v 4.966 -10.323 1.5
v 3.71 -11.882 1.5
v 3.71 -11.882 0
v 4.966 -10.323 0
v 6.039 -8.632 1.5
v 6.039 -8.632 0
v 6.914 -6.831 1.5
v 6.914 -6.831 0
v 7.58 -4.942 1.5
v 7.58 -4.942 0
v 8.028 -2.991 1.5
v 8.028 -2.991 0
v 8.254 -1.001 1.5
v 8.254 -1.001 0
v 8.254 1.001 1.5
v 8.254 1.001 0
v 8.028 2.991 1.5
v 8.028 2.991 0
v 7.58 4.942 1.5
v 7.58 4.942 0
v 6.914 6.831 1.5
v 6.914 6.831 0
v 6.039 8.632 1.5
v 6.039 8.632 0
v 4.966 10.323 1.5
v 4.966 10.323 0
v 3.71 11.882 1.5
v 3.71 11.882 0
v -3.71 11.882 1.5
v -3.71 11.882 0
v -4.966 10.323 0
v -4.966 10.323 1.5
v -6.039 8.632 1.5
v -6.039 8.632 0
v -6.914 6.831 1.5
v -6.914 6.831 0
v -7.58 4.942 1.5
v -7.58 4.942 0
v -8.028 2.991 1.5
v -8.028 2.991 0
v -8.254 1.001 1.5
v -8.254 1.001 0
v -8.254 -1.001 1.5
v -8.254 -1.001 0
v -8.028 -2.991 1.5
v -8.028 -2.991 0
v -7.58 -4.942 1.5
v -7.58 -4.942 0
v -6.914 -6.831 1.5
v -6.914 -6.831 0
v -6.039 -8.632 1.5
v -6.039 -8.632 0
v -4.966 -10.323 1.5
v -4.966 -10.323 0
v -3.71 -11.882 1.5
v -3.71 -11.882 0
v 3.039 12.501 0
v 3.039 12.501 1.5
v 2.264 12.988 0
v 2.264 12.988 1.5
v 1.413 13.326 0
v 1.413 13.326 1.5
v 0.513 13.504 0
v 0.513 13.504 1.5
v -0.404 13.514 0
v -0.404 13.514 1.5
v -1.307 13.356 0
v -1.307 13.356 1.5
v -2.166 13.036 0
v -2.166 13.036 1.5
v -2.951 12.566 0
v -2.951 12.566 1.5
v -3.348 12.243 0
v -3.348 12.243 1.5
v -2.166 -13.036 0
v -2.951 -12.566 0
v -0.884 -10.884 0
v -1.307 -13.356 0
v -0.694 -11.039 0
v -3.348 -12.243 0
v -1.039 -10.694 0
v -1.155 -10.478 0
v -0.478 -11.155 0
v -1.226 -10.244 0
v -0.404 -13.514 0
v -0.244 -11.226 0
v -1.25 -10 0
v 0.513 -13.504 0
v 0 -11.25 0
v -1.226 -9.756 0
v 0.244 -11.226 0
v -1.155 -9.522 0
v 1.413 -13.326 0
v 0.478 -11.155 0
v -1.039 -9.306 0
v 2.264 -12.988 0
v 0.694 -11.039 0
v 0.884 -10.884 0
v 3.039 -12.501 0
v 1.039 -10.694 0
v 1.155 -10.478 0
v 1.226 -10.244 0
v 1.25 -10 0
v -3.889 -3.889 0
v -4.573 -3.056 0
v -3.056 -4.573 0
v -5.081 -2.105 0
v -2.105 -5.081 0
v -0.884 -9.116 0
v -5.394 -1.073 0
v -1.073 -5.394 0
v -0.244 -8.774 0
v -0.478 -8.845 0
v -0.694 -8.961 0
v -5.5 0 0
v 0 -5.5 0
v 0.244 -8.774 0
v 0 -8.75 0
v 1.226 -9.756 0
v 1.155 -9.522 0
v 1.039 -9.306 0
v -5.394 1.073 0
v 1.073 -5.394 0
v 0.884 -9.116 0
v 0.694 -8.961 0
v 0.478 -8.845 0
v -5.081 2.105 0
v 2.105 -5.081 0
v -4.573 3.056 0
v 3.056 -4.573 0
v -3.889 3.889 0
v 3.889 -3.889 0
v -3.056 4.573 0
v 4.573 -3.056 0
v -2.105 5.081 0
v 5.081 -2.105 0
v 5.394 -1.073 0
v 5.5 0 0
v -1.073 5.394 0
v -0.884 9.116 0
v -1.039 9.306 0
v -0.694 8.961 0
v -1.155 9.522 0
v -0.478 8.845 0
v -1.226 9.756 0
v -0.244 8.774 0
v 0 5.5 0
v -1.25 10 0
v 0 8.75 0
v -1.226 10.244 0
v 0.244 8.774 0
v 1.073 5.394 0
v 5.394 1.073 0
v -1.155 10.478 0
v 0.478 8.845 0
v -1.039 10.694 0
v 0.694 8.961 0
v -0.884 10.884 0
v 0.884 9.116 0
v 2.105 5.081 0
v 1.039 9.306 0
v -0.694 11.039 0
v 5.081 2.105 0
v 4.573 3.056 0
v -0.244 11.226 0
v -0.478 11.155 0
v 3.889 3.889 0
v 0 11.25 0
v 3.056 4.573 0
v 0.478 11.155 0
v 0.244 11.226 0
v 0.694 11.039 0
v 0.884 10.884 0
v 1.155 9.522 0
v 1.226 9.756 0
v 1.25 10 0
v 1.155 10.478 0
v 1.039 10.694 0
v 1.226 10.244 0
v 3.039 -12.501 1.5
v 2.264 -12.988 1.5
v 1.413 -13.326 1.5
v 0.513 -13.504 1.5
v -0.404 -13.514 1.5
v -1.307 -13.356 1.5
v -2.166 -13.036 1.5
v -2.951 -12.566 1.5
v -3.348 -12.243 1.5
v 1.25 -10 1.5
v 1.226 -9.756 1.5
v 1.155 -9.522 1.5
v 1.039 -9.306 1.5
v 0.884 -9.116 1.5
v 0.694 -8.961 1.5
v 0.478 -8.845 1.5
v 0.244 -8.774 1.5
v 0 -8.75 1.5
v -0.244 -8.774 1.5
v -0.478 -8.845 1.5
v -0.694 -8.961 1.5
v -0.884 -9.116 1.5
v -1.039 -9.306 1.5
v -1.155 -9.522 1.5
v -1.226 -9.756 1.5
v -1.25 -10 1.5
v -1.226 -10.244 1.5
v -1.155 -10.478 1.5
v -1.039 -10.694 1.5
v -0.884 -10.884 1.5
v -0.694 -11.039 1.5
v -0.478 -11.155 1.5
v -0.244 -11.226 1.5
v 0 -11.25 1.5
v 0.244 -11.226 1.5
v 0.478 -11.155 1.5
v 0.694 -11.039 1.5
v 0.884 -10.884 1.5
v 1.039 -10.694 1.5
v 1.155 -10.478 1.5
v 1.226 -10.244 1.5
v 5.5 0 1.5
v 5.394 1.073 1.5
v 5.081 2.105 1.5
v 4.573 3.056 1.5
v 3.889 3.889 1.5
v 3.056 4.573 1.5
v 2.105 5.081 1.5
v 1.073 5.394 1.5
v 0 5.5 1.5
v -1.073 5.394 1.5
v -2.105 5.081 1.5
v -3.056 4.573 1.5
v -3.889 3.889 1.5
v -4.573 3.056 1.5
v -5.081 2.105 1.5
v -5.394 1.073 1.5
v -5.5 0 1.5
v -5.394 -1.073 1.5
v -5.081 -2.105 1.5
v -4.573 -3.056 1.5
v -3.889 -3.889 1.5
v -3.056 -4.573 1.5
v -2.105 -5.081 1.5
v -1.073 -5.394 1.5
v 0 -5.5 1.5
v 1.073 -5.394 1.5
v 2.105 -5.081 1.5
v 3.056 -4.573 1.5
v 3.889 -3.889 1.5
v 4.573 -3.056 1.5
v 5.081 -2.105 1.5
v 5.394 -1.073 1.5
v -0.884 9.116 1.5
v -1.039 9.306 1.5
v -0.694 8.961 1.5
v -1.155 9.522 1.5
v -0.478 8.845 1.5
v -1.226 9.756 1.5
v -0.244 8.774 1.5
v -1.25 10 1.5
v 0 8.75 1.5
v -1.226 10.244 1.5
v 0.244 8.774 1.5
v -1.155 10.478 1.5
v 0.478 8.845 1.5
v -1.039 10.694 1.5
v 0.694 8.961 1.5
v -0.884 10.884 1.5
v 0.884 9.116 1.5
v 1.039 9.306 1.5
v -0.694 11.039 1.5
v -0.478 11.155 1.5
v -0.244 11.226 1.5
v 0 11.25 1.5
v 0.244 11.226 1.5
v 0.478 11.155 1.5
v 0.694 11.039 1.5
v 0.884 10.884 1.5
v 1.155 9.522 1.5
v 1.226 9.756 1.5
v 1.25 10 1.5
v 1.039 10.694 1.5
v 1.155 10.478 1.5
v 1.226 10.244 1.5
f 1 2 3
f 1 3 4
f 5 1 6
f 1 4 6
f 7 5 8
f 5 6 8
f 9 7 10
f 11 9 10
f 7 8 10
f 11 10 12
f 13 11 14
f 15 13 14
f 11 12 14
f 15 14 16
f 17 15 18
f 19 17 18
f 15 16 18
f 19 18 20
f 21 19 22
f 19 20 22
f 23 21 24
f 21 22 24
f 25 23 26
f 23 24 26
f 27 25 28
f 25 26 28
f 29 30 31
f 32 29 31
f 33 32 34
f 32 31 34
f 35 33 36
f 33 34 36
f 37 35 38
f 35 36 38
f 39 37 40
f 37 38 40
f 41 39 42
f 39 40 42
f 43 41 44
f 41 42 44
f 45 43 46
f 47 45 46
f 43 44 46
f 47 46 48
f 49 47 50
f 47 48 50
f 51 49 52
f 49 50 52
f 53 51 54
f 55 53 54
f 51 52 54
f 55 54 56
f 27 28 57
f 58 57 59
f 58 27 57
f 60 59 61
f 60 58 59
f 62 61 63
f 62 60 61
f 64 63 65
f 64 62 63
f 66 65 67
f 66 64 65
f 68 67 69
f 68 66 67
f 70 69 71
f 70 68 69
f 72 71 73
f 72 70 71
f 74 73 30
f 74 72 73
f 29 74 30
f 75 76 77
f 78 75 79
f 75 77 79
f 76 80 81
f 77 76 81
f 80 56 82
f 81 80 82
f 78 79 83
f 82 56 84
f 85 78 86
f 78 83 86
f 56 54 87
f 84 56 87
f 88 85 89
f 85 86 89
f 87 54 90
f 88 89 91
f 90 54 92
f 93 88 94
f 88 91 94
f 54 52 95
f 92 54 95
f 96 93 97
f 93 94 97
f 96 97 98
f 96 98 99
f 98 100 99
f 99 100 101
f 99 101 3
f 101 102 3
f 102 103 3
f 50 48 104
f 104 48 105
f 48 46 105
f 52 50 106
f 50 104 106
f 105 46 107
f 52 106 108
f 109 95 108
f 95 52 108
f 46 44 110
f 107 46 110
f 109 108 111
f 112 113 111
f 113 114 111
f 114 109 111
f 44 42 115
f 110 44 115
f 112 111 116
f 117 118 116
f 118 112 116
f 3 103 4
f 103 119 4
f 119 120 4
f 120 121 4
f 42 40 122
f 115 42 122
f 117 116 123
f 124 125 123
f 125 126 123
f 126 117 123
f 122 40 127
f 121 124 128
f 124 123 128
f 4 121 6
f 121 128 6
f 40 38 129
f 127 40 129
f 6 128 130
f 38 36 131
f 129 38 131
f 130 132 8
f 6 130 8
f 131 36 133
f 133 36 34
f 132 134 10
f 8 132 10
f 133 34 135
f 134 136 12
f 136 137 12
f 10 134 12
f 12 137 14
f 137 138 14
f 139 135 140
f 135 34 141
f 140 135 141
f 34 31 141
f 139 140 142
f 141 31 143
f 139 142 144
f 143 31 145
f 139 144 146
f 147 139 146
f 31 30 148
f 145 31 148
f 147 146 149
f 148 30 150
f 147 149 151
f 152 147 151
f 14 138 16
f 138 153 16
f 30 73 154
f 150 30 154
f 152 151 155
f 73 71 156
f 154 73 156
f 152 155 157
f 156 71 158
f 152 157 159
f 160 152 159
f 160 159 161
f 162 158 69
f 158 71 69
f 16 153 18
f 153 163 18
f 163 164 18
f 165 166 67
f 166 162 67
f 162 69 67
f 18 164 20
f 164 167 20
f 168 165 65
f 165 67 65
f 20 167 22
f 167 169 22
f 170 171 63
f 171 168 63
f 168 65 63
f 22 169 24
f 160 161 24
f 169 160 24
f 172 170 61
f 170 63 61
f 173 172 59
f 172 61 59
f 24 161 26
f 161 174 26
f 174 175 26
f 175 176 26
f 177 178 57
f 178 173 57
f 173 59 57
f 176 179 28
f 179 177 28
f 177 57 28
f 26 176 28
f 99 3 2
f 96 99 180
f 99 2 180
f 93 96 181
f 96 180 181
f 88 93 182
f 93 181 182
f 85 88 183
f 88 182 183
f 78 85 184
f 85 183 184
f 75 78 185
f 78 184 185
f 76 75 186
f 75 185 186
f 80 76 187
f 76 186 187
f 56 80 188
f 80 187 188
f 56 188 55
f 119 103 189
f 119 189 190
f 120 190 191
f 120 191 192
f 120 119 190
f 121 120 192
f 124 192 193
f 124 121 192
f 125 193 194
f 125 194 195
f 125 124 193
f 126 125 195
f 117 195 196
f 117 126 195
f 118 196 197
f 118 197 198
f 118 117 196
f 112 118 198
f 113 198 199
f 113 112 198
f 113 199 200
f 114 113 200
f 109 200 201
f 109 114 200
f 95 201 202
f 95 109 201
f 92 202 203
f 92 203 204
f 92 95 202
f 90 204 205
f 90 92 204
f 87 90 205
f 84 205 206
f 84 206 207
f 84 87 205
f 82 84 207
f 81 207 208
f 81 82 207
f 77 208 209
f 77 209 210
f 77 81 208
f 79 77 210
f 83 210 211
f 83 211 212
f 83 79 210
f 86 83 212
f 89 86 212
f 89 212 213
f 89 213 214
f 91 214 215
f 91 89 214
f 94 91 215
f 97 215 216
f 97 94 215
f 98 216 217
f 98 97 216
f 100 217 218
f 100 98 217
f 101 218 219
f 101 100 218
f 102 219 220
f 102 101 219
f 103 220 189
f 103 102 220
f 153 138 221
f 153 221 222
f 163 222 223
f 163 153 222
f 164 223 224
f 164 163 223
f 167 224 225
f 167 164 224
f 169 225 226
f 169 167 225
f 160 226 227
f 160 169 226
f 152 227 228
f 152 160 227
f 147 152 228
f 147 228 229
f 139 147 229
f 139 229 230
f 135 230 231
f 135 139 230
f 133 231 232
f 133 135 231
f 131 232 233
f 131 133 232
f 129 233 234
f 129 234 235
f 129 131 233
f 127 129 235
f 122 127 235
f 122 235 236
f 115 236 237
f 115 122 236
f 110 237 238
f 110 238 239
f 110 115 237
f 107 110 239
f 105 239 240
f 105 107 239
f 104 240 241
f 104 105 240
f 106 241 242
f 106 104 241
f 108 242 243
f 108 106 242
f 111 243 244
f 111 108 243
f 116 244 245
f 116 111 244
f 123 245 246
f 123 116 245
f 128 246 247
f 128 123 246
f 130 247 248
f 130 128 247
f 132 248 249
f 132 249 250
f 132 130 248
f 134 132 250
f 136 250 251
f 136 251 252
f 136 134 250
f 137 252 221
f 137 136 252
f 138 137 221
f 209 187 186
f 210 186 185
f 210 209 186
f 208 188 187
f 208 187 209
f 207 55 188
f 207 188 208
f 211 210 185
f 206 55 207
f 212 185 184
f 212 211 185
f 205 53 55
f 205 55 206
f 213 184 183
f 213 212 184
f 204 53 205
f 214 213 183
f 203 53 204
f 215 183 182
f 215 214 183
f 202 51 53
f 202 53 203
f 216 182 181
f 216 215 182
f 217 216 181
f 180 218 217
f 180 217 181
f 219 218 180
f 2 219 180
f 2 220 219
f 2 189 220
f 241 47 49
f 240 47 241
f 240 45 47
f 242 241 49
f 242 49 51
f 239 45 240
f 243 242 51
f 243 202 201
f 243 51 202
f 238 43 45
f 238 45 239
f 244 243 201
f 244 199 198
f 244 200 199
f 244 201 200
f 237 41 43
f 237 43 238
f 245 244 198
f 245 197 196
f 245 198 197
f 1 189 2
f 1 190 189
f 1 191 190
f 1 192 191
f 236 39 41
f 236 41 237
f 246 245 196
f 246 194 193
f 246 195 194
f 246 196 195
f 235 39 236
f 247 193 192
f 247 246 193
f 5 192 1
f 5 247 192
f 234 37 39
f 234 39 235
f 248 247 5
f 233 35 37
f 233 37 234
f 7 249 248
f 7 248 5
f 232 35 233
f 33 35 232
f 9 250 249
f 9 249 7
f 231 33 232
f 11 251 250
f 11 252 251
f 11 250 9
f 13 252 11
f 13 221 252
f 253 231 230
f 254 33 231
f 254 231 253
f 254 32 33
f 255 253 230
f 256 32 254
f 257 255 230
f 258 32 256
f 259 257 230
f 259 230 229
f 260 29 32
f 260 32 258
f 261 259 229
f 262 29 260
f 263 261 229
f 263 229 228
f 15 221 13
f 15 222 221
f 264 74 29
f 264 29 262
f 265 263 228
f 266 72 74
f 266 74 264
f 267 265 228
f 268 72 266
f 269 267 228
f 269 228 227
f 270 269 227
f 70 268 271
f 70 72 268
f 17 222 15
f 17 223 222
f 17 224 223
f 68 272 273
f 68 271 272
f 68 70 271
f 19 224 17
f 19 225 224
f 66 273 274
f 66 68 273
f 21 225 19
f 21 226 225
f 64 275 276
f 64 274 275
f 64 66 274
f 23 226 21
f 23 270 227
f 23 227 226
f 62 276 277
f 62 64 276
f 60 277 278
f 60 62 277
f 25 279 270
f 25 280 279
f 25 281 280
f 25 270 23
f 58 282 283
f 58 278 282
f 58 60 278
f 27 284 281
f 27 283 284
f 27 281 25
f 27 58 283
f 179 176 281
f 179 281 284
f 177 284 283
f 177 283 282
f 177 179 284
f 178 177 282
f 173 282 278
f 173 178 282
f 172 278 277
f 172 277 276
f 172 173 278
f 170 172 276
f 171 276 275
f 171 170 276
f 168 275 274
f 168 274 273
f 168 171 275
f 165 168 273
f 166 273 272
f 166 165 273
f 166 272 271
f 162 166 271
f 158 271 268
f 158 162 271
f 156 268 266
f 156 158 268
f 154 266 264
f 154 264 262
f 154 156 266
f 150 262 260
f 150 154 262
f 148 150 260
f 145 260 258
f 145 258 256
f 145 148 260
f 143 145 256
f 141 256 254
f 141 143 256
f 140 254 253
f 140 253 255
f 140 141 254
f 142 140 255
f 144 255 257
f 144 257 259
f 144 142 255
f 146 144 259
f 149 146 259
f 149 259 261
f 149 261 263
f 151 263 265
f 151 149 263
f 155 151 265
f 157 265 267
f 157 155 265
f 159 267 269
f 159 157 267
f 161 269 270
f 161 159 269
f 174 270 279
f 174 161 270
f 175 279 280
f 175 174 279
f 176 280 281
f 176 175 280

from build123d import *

# Parameters (mm, degrees)
F0_R     = 1.25
F0_R_2   = 5.5
F1_DEPTH = 1.5
F2_R     = 5


with BuildPart() as f1:
    # F0 (on Top) → F1 (new body)
    with BuildSketch(Plane.XY):
        with BuildLine():
            ThreePointArc((0, -15), (8.2826006835, 0), (0, 15))
            ThreePointArc((0, 15), (-8.2826006835, 0), (0, -15))
        make_face()
        with Locations((0, -10)):
            Circle(F0_R, mode=Mode.SUBTRACT)
        Circle(F0_R_2, mode=Mode.SUBTRACT)
        with Locations((0, 10)):
            Circle(F0_R, mode=Mode.SUBTRACT)
    extrude(amount=F1_DEPTH)

    # F2
    f2_edges = [f1.edges().sort_by_distance(p)[0] for p in [
        (0, -15, 0.75),
        (0, 15, 0.75),
    ]]
    fillet(f2_edges, radius=F2_R)


solid = f1.part
